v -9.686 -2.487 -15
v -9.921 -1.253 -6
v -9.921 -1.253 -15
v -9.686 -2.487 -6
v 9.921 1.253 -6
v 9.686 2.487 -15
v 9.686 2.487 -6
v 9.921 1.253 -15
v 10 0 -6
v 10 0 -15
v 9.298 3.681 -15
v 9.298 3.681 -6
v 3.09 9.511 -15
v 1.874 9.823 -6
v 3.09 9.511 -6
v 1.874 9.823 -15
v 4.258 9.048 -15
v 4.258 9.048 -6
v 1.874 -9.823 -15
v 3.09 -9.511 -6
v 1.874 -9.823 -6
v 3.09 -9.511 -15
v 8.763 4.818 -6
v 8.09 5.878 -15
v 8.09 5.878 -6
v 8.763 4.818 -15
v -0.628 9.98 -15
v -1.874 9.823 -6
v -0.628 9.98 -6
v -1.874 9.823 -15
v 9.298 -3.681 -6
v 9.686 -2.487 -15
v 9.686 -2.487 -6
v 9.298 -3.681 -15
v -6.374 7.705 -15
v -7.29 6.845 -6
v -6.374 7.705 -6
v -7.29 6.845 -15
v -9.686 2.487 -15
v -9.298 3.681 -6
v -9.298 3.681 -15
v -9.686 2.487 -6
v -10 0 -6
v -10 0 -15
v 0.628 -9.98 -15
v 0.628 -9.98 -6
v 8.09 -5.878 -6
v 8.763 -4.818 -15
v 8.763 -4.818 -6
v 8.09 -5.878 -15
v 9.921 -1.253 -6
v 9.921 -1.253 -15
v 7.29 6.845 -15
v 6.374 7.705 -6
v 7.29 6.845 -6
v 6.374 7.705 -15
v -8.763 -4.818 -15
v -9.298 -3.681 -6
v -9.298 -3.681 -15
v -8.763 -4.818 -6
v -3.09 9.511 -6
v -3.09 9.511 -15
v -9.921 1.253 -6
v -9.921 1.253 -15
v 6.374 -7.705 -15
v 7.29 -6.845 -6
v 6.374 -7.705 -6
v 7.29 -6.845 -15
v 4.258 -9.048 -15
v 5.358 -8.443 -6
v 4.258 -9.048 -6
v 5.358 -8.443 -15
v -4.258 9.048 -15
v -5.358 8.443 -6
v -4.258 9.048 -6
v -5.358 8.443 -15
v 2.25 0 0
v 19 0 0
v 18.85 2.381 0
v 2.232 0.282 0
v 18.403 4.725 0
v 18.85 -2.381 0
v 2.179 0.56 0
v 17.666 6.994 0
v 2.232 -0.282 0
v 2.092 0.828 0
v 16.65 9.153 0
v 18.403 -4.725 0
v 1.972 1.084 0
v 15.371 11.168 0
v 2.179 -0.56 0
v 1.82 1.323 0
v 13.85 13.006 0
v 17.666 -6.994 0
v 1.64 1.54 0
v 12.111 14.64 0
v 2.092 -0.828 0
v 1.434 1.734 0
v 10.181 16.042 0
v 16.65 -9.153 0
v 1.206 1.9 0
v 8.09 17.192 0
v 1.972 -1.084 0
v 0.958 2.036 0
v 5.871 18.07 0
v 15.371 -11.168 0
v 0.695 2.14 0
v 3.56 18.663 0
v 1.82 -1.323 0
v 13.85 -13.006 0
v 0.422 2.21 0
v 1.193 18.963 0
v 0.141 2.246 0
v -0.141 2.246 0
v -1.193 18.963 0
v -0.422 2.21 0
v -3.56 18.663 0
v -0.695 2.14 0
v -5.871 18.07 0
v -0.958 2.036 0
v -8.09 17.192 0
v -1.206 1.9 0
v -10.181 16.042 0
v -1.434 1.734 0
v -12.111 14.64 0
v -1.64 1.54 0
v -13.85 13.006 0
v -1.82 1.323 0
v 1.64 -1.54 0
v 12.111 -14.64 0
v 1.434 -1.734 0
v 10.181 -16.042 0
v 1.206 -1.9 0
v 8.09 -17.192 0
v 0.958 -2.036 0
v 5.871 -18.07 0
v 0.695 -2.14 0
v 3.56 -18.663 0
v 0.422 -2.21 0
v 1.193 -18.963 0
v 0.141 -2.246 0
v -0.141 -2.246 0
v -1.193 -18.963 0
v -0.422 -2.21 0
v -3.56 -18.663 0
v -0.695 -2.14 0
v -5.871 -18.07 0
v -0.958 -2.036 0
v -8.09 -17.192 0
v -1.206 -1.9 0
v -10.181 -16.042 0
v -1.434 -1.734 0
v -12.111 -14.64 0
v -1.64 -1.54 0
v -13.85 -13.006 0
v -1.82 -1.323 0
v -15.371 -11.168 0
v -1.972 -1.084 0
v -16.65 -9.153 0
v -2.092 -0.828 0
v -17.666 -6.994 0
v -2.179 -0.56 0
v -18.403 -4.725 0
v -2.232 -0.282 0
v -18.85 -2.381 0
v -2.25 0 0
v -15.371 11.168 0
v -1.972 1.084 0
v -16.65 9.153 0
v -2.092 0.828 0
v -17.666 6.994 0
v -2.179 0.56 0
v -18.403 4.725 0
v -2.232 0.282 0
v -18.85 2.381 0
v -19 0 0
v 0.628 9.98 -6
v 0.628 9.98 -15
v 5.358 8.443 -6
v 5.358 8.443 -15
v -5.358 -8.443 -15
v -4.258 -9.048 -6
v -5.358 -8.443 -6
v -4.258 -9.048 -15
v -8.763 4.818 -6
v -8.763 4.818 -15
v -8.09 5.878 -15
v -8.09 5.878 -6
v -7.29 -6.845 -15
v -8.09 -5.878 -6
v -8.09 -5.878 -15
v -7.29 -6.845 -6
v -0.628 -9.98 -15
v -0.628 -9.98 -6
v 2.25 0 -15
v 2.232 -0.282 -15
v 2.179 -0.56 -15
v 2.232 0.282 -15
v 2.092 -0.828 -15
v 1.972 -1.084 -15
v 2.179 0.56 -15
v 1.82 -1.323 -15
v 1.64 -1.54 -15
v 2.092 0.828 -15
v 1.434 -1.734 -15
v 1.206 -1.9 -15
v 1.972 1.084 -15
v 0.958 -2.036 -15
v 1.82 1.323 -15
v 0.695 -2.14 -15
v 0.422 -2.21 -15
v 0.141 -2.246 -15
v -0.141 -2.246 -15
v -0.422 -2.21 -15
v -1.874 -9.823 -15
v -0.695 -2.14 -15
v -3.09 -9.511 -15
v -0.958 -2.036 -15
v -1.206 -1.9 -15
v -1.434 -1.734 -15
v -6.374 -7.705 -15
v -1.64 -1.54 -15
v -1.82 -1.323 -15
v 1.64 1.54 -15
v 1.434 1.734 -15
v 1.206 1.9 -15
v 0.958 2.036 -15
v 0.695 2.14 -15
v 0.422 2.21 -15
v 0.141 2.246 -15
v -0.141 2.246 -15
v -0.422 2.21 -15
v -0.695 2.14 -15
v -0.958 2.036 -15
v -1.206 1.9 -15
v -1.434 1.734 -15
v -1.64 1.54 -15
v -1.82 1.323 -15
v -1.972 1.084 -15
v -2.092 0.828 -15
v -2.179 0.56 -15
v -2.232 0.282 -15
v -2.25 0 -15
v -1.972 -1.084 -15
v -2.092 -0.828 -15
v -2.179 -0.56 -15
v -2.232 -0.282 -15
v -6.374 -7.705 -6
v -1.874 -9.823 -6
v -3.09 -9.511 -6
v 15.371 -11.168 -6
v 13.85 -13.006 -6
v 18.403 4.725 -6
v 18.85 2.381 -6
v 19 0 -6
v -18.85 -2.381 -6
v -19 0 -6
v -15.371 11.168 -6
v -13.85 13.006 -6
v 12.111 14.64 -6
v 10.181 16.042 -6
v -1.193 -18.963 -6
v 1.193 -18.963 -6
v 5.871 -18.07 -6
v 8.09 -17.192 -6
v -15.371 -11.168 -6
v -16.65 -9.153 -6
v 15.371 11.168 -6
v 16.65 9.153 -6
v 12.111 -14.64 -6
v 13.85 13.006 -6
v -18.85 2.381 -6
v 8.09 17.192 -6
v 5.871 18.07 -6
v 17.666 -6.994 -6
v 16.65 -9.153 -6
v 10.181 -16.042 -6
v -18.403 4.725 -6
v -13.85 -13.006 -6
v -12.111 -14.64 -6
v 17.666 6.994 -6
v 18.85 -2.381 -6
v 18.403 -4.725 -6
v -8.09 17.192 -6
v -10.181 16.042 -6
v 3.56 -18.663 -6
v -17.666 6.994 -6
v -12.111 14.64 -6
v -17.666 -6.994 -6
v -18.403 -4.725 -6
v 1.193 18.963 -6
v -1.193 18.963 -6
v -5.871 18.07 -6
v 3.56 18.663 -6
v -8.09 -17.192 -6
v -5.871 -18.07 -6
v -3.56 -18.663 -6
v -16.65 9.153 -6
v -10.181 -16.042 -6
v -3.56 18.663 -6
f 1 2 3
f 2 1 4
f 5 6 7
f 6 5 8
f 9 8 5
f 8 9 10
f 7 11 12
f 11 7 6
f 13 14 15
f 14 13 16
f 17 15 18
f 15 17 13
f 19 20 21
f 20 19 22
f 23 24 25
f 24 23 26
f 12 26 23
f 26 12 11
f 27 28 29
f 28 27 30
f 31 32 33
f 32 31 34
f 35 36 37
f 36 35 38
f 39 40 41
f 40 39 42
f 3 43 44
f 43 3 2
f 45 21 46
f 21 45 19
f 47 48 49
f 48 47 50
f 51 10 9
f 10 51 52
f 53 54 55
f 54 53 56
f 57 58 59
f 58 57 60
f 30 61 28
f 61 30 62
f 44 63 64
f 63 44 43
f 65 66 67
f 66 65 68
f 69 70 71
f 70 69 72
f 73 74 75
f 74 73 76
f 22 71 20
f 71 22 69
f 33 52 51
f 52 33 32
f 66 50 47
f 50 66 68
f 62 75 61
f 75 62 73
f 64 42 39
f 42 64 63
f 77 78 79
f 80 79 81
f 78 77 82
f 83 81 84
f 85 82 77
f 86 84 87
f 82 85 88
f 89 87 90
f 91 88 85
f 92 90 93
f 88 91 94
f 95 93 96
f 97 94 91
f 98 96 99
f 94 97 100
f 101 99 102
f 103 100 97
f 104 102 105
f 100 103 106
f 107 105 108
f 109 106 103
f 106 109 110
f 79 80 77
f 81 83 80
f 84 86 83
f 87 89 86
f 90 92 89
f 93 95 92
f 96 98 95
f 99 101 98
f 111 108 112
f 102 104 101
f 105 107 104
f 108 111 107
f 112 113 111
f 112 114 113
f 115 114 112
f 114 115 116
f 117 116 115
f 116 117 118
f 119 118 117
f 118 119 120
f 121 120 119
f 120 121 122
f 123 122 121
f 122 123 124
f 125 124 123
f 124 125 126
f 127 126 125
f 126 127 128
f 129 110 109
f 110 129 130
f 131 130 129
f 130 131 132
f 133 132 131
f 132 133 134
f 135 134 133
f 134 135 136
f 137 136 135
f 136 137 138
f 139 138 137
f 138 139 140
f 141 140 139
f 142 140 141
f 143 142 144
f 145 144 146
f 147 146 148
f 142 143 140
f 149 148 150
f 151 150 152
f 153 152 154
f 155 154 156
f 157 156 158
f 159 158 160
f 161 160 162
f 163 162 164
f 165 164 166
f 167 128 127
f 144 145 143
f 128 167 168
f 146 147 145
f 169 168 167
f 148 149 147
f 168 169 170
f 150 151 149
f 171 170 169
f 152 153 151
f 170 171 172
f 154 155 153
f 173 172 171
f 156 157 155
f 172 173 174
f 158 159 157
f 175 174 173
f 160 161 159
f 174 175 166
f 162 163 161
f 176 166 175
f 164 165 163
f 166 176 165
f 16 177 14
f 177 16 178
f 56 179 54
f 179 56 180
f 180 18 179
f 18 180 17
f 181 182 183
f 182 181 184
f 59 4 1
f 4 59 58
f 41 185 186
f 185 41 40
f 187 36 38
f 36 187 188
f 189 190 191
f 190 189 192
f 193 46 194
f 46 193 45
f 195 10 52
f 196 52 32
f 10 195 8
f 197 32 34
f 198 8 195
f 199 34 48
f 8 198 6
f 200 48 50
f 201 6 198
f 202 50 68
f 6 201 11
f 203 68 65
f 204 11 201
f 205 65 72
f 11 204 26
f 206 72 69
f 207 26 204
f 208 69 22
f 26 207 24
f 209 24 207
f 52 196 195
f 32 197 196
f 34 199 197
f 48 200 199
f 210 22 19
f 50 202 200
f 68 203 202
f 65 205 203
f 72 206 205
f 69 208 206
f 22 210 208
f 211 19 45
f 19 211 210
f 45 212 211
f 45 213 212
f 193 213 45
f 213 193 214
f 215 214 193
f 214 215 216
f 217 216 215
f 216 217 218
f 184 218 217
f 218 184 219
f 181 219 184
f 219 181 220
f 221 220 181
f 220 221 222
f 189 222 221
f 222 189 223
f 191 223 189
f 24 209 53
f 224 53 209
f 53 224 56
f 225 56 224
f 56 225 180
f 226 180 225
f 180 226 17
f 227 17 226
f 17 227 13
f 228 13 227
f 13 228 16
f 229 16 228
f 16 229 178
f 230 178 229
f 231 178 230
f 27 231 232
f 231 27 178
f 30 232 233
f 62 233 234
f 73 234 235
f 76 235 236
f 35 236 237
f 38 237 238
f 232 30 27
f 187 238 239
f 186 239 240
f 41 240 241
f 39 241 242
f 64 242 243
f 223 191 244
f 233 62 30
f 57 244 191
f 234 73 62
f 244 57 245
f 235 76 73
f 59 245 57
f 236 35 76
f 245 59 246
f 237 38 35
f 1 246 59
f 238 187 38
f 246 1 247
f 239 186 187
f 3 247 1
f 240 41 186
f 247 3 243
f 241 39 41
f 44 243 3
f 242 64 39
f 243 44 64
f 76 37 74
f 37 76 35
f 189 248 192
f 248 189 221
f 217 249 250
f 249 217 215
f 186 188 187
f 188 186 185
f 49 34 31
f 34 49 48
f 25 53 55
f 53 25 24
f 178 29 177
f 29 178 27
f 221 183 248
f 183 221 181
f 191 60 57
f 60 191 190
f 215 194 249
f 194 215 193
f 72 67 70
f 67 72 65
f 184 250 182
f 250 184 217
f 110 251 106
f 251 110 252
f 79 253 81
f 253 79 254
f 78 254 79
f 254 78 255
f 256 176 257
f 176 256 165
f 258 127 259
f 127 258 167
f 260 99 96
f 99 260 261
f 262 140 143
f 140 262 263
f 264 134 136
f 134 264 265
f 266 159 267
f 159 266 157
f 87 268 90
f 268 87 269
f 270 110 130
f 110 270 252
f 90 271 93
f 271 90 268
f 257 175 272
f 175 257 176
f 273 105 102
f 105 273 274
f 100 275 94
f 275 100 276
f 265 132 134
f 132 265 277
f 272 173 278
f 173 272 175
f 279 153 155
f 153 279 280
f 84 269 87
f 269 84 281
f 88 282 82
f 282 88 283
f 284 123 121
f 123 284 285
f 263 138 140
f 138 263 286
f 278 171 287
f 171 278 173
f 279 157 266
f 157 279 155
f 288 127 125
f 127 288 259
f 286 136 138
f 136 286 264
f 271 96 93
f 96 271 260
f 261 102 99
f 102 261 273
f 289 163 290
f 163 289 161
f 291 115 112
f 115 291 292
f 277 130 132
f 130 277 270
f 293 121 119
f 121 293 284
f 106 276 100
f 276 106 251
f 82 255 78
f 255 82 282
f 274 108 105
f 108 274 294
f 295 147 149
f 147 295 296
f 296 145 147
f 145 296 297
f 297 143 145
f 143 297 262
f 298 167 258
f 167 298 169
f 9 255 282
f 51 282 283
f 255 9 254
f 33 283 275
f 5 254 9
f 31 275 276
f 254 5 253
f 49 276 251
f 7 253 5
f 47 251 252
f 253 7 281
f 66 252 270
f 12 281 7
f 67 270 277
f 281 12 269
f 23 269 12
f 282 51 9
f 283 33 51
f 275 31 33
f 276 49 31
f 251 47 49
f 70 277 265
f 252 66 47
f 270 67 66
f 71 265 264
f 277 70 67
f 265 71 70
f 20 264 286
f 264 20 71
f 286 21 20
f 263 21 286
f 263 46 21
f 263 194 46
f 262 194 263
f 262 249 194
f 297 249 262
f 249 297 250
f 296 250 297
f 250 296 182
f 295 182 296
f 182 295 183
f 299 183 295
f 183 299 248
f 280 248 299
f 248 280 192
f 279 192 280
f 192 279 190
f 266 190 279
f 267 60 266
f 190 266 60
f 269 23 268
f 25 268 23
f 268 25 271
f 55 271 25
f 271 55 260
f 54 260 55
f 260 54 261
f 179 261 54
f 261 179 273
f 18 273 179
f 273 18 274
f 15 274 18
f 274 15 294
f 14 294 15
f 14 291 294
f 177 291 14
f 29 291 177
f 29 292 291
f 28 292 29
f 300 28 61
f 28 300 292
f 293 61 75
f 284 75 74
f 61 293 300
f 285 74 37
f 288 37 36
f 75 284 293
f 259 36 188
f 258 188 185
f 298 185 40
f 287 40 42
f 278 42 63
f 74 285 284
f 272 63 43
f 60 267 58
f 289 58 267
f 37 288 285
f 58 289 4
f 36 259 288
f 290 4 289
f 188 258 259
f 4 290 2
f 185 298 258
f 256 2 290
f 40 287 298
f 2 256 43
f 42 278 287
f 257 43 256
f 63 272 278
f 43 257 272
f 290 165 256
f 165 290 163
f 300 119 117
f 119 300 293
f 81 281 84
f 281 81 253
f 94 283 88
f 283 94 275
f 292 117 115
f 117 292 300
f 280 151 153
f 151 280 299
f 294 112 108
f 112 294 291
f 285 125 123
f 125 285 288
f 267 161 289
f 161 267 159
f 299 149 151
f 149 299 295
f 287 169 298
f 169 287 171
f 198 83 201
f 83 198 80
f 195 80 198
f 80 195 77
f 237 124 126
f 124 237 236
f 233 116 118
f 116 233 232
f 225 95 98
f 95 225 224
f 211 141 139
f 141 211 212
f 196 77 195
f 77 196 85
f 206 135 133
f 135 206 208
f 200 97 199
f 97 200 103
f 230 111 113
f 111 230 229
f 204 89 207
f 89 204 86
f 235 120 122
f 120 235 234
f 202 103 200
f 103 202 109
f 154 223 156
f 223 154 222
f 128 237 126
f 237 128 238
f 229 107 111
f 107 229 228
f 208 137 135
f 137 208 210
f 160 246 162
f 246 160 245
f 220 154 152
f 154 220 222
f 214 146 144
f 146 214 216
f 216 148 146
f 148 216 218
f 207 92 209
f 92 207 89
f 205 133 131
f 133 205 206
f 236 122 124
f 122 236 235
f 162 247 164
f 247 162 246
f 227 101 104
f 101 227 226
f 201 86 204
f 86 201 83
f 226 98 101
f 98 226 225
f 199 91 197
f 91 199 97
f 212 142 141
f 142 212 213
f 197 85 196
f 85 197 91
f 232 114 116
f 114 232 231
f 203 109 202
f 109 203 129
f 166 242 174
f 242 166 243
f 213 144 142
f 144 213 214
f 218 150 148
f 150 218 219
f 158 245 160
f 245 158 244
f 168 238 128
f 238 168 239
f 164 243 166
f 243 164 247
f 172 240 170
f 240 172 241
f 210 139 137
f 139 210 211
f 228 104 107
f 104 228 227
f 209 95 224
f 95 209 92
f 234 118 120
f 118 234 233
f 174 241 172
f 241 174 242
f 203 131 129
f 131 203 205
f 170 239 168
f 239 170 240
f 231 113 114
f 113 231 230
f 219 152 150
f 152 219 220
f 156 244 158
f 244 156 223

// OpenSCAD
$fn = 50;


difference() {
	union() {
		translate(v = [0, 0, -15.0000000000]) {
			cylinder(h = 15, r = 10.0000000000);
		}
		translate(v = [0, 0, -6.0000000000]) {
			cylinder(h = 6, r = 19.0000000000);
		}
	}
	union() {
		#translate(v = [0, 0, -15]) {
			cylinder(h = 15, r = 2.2500000000);
		}
	}
}
